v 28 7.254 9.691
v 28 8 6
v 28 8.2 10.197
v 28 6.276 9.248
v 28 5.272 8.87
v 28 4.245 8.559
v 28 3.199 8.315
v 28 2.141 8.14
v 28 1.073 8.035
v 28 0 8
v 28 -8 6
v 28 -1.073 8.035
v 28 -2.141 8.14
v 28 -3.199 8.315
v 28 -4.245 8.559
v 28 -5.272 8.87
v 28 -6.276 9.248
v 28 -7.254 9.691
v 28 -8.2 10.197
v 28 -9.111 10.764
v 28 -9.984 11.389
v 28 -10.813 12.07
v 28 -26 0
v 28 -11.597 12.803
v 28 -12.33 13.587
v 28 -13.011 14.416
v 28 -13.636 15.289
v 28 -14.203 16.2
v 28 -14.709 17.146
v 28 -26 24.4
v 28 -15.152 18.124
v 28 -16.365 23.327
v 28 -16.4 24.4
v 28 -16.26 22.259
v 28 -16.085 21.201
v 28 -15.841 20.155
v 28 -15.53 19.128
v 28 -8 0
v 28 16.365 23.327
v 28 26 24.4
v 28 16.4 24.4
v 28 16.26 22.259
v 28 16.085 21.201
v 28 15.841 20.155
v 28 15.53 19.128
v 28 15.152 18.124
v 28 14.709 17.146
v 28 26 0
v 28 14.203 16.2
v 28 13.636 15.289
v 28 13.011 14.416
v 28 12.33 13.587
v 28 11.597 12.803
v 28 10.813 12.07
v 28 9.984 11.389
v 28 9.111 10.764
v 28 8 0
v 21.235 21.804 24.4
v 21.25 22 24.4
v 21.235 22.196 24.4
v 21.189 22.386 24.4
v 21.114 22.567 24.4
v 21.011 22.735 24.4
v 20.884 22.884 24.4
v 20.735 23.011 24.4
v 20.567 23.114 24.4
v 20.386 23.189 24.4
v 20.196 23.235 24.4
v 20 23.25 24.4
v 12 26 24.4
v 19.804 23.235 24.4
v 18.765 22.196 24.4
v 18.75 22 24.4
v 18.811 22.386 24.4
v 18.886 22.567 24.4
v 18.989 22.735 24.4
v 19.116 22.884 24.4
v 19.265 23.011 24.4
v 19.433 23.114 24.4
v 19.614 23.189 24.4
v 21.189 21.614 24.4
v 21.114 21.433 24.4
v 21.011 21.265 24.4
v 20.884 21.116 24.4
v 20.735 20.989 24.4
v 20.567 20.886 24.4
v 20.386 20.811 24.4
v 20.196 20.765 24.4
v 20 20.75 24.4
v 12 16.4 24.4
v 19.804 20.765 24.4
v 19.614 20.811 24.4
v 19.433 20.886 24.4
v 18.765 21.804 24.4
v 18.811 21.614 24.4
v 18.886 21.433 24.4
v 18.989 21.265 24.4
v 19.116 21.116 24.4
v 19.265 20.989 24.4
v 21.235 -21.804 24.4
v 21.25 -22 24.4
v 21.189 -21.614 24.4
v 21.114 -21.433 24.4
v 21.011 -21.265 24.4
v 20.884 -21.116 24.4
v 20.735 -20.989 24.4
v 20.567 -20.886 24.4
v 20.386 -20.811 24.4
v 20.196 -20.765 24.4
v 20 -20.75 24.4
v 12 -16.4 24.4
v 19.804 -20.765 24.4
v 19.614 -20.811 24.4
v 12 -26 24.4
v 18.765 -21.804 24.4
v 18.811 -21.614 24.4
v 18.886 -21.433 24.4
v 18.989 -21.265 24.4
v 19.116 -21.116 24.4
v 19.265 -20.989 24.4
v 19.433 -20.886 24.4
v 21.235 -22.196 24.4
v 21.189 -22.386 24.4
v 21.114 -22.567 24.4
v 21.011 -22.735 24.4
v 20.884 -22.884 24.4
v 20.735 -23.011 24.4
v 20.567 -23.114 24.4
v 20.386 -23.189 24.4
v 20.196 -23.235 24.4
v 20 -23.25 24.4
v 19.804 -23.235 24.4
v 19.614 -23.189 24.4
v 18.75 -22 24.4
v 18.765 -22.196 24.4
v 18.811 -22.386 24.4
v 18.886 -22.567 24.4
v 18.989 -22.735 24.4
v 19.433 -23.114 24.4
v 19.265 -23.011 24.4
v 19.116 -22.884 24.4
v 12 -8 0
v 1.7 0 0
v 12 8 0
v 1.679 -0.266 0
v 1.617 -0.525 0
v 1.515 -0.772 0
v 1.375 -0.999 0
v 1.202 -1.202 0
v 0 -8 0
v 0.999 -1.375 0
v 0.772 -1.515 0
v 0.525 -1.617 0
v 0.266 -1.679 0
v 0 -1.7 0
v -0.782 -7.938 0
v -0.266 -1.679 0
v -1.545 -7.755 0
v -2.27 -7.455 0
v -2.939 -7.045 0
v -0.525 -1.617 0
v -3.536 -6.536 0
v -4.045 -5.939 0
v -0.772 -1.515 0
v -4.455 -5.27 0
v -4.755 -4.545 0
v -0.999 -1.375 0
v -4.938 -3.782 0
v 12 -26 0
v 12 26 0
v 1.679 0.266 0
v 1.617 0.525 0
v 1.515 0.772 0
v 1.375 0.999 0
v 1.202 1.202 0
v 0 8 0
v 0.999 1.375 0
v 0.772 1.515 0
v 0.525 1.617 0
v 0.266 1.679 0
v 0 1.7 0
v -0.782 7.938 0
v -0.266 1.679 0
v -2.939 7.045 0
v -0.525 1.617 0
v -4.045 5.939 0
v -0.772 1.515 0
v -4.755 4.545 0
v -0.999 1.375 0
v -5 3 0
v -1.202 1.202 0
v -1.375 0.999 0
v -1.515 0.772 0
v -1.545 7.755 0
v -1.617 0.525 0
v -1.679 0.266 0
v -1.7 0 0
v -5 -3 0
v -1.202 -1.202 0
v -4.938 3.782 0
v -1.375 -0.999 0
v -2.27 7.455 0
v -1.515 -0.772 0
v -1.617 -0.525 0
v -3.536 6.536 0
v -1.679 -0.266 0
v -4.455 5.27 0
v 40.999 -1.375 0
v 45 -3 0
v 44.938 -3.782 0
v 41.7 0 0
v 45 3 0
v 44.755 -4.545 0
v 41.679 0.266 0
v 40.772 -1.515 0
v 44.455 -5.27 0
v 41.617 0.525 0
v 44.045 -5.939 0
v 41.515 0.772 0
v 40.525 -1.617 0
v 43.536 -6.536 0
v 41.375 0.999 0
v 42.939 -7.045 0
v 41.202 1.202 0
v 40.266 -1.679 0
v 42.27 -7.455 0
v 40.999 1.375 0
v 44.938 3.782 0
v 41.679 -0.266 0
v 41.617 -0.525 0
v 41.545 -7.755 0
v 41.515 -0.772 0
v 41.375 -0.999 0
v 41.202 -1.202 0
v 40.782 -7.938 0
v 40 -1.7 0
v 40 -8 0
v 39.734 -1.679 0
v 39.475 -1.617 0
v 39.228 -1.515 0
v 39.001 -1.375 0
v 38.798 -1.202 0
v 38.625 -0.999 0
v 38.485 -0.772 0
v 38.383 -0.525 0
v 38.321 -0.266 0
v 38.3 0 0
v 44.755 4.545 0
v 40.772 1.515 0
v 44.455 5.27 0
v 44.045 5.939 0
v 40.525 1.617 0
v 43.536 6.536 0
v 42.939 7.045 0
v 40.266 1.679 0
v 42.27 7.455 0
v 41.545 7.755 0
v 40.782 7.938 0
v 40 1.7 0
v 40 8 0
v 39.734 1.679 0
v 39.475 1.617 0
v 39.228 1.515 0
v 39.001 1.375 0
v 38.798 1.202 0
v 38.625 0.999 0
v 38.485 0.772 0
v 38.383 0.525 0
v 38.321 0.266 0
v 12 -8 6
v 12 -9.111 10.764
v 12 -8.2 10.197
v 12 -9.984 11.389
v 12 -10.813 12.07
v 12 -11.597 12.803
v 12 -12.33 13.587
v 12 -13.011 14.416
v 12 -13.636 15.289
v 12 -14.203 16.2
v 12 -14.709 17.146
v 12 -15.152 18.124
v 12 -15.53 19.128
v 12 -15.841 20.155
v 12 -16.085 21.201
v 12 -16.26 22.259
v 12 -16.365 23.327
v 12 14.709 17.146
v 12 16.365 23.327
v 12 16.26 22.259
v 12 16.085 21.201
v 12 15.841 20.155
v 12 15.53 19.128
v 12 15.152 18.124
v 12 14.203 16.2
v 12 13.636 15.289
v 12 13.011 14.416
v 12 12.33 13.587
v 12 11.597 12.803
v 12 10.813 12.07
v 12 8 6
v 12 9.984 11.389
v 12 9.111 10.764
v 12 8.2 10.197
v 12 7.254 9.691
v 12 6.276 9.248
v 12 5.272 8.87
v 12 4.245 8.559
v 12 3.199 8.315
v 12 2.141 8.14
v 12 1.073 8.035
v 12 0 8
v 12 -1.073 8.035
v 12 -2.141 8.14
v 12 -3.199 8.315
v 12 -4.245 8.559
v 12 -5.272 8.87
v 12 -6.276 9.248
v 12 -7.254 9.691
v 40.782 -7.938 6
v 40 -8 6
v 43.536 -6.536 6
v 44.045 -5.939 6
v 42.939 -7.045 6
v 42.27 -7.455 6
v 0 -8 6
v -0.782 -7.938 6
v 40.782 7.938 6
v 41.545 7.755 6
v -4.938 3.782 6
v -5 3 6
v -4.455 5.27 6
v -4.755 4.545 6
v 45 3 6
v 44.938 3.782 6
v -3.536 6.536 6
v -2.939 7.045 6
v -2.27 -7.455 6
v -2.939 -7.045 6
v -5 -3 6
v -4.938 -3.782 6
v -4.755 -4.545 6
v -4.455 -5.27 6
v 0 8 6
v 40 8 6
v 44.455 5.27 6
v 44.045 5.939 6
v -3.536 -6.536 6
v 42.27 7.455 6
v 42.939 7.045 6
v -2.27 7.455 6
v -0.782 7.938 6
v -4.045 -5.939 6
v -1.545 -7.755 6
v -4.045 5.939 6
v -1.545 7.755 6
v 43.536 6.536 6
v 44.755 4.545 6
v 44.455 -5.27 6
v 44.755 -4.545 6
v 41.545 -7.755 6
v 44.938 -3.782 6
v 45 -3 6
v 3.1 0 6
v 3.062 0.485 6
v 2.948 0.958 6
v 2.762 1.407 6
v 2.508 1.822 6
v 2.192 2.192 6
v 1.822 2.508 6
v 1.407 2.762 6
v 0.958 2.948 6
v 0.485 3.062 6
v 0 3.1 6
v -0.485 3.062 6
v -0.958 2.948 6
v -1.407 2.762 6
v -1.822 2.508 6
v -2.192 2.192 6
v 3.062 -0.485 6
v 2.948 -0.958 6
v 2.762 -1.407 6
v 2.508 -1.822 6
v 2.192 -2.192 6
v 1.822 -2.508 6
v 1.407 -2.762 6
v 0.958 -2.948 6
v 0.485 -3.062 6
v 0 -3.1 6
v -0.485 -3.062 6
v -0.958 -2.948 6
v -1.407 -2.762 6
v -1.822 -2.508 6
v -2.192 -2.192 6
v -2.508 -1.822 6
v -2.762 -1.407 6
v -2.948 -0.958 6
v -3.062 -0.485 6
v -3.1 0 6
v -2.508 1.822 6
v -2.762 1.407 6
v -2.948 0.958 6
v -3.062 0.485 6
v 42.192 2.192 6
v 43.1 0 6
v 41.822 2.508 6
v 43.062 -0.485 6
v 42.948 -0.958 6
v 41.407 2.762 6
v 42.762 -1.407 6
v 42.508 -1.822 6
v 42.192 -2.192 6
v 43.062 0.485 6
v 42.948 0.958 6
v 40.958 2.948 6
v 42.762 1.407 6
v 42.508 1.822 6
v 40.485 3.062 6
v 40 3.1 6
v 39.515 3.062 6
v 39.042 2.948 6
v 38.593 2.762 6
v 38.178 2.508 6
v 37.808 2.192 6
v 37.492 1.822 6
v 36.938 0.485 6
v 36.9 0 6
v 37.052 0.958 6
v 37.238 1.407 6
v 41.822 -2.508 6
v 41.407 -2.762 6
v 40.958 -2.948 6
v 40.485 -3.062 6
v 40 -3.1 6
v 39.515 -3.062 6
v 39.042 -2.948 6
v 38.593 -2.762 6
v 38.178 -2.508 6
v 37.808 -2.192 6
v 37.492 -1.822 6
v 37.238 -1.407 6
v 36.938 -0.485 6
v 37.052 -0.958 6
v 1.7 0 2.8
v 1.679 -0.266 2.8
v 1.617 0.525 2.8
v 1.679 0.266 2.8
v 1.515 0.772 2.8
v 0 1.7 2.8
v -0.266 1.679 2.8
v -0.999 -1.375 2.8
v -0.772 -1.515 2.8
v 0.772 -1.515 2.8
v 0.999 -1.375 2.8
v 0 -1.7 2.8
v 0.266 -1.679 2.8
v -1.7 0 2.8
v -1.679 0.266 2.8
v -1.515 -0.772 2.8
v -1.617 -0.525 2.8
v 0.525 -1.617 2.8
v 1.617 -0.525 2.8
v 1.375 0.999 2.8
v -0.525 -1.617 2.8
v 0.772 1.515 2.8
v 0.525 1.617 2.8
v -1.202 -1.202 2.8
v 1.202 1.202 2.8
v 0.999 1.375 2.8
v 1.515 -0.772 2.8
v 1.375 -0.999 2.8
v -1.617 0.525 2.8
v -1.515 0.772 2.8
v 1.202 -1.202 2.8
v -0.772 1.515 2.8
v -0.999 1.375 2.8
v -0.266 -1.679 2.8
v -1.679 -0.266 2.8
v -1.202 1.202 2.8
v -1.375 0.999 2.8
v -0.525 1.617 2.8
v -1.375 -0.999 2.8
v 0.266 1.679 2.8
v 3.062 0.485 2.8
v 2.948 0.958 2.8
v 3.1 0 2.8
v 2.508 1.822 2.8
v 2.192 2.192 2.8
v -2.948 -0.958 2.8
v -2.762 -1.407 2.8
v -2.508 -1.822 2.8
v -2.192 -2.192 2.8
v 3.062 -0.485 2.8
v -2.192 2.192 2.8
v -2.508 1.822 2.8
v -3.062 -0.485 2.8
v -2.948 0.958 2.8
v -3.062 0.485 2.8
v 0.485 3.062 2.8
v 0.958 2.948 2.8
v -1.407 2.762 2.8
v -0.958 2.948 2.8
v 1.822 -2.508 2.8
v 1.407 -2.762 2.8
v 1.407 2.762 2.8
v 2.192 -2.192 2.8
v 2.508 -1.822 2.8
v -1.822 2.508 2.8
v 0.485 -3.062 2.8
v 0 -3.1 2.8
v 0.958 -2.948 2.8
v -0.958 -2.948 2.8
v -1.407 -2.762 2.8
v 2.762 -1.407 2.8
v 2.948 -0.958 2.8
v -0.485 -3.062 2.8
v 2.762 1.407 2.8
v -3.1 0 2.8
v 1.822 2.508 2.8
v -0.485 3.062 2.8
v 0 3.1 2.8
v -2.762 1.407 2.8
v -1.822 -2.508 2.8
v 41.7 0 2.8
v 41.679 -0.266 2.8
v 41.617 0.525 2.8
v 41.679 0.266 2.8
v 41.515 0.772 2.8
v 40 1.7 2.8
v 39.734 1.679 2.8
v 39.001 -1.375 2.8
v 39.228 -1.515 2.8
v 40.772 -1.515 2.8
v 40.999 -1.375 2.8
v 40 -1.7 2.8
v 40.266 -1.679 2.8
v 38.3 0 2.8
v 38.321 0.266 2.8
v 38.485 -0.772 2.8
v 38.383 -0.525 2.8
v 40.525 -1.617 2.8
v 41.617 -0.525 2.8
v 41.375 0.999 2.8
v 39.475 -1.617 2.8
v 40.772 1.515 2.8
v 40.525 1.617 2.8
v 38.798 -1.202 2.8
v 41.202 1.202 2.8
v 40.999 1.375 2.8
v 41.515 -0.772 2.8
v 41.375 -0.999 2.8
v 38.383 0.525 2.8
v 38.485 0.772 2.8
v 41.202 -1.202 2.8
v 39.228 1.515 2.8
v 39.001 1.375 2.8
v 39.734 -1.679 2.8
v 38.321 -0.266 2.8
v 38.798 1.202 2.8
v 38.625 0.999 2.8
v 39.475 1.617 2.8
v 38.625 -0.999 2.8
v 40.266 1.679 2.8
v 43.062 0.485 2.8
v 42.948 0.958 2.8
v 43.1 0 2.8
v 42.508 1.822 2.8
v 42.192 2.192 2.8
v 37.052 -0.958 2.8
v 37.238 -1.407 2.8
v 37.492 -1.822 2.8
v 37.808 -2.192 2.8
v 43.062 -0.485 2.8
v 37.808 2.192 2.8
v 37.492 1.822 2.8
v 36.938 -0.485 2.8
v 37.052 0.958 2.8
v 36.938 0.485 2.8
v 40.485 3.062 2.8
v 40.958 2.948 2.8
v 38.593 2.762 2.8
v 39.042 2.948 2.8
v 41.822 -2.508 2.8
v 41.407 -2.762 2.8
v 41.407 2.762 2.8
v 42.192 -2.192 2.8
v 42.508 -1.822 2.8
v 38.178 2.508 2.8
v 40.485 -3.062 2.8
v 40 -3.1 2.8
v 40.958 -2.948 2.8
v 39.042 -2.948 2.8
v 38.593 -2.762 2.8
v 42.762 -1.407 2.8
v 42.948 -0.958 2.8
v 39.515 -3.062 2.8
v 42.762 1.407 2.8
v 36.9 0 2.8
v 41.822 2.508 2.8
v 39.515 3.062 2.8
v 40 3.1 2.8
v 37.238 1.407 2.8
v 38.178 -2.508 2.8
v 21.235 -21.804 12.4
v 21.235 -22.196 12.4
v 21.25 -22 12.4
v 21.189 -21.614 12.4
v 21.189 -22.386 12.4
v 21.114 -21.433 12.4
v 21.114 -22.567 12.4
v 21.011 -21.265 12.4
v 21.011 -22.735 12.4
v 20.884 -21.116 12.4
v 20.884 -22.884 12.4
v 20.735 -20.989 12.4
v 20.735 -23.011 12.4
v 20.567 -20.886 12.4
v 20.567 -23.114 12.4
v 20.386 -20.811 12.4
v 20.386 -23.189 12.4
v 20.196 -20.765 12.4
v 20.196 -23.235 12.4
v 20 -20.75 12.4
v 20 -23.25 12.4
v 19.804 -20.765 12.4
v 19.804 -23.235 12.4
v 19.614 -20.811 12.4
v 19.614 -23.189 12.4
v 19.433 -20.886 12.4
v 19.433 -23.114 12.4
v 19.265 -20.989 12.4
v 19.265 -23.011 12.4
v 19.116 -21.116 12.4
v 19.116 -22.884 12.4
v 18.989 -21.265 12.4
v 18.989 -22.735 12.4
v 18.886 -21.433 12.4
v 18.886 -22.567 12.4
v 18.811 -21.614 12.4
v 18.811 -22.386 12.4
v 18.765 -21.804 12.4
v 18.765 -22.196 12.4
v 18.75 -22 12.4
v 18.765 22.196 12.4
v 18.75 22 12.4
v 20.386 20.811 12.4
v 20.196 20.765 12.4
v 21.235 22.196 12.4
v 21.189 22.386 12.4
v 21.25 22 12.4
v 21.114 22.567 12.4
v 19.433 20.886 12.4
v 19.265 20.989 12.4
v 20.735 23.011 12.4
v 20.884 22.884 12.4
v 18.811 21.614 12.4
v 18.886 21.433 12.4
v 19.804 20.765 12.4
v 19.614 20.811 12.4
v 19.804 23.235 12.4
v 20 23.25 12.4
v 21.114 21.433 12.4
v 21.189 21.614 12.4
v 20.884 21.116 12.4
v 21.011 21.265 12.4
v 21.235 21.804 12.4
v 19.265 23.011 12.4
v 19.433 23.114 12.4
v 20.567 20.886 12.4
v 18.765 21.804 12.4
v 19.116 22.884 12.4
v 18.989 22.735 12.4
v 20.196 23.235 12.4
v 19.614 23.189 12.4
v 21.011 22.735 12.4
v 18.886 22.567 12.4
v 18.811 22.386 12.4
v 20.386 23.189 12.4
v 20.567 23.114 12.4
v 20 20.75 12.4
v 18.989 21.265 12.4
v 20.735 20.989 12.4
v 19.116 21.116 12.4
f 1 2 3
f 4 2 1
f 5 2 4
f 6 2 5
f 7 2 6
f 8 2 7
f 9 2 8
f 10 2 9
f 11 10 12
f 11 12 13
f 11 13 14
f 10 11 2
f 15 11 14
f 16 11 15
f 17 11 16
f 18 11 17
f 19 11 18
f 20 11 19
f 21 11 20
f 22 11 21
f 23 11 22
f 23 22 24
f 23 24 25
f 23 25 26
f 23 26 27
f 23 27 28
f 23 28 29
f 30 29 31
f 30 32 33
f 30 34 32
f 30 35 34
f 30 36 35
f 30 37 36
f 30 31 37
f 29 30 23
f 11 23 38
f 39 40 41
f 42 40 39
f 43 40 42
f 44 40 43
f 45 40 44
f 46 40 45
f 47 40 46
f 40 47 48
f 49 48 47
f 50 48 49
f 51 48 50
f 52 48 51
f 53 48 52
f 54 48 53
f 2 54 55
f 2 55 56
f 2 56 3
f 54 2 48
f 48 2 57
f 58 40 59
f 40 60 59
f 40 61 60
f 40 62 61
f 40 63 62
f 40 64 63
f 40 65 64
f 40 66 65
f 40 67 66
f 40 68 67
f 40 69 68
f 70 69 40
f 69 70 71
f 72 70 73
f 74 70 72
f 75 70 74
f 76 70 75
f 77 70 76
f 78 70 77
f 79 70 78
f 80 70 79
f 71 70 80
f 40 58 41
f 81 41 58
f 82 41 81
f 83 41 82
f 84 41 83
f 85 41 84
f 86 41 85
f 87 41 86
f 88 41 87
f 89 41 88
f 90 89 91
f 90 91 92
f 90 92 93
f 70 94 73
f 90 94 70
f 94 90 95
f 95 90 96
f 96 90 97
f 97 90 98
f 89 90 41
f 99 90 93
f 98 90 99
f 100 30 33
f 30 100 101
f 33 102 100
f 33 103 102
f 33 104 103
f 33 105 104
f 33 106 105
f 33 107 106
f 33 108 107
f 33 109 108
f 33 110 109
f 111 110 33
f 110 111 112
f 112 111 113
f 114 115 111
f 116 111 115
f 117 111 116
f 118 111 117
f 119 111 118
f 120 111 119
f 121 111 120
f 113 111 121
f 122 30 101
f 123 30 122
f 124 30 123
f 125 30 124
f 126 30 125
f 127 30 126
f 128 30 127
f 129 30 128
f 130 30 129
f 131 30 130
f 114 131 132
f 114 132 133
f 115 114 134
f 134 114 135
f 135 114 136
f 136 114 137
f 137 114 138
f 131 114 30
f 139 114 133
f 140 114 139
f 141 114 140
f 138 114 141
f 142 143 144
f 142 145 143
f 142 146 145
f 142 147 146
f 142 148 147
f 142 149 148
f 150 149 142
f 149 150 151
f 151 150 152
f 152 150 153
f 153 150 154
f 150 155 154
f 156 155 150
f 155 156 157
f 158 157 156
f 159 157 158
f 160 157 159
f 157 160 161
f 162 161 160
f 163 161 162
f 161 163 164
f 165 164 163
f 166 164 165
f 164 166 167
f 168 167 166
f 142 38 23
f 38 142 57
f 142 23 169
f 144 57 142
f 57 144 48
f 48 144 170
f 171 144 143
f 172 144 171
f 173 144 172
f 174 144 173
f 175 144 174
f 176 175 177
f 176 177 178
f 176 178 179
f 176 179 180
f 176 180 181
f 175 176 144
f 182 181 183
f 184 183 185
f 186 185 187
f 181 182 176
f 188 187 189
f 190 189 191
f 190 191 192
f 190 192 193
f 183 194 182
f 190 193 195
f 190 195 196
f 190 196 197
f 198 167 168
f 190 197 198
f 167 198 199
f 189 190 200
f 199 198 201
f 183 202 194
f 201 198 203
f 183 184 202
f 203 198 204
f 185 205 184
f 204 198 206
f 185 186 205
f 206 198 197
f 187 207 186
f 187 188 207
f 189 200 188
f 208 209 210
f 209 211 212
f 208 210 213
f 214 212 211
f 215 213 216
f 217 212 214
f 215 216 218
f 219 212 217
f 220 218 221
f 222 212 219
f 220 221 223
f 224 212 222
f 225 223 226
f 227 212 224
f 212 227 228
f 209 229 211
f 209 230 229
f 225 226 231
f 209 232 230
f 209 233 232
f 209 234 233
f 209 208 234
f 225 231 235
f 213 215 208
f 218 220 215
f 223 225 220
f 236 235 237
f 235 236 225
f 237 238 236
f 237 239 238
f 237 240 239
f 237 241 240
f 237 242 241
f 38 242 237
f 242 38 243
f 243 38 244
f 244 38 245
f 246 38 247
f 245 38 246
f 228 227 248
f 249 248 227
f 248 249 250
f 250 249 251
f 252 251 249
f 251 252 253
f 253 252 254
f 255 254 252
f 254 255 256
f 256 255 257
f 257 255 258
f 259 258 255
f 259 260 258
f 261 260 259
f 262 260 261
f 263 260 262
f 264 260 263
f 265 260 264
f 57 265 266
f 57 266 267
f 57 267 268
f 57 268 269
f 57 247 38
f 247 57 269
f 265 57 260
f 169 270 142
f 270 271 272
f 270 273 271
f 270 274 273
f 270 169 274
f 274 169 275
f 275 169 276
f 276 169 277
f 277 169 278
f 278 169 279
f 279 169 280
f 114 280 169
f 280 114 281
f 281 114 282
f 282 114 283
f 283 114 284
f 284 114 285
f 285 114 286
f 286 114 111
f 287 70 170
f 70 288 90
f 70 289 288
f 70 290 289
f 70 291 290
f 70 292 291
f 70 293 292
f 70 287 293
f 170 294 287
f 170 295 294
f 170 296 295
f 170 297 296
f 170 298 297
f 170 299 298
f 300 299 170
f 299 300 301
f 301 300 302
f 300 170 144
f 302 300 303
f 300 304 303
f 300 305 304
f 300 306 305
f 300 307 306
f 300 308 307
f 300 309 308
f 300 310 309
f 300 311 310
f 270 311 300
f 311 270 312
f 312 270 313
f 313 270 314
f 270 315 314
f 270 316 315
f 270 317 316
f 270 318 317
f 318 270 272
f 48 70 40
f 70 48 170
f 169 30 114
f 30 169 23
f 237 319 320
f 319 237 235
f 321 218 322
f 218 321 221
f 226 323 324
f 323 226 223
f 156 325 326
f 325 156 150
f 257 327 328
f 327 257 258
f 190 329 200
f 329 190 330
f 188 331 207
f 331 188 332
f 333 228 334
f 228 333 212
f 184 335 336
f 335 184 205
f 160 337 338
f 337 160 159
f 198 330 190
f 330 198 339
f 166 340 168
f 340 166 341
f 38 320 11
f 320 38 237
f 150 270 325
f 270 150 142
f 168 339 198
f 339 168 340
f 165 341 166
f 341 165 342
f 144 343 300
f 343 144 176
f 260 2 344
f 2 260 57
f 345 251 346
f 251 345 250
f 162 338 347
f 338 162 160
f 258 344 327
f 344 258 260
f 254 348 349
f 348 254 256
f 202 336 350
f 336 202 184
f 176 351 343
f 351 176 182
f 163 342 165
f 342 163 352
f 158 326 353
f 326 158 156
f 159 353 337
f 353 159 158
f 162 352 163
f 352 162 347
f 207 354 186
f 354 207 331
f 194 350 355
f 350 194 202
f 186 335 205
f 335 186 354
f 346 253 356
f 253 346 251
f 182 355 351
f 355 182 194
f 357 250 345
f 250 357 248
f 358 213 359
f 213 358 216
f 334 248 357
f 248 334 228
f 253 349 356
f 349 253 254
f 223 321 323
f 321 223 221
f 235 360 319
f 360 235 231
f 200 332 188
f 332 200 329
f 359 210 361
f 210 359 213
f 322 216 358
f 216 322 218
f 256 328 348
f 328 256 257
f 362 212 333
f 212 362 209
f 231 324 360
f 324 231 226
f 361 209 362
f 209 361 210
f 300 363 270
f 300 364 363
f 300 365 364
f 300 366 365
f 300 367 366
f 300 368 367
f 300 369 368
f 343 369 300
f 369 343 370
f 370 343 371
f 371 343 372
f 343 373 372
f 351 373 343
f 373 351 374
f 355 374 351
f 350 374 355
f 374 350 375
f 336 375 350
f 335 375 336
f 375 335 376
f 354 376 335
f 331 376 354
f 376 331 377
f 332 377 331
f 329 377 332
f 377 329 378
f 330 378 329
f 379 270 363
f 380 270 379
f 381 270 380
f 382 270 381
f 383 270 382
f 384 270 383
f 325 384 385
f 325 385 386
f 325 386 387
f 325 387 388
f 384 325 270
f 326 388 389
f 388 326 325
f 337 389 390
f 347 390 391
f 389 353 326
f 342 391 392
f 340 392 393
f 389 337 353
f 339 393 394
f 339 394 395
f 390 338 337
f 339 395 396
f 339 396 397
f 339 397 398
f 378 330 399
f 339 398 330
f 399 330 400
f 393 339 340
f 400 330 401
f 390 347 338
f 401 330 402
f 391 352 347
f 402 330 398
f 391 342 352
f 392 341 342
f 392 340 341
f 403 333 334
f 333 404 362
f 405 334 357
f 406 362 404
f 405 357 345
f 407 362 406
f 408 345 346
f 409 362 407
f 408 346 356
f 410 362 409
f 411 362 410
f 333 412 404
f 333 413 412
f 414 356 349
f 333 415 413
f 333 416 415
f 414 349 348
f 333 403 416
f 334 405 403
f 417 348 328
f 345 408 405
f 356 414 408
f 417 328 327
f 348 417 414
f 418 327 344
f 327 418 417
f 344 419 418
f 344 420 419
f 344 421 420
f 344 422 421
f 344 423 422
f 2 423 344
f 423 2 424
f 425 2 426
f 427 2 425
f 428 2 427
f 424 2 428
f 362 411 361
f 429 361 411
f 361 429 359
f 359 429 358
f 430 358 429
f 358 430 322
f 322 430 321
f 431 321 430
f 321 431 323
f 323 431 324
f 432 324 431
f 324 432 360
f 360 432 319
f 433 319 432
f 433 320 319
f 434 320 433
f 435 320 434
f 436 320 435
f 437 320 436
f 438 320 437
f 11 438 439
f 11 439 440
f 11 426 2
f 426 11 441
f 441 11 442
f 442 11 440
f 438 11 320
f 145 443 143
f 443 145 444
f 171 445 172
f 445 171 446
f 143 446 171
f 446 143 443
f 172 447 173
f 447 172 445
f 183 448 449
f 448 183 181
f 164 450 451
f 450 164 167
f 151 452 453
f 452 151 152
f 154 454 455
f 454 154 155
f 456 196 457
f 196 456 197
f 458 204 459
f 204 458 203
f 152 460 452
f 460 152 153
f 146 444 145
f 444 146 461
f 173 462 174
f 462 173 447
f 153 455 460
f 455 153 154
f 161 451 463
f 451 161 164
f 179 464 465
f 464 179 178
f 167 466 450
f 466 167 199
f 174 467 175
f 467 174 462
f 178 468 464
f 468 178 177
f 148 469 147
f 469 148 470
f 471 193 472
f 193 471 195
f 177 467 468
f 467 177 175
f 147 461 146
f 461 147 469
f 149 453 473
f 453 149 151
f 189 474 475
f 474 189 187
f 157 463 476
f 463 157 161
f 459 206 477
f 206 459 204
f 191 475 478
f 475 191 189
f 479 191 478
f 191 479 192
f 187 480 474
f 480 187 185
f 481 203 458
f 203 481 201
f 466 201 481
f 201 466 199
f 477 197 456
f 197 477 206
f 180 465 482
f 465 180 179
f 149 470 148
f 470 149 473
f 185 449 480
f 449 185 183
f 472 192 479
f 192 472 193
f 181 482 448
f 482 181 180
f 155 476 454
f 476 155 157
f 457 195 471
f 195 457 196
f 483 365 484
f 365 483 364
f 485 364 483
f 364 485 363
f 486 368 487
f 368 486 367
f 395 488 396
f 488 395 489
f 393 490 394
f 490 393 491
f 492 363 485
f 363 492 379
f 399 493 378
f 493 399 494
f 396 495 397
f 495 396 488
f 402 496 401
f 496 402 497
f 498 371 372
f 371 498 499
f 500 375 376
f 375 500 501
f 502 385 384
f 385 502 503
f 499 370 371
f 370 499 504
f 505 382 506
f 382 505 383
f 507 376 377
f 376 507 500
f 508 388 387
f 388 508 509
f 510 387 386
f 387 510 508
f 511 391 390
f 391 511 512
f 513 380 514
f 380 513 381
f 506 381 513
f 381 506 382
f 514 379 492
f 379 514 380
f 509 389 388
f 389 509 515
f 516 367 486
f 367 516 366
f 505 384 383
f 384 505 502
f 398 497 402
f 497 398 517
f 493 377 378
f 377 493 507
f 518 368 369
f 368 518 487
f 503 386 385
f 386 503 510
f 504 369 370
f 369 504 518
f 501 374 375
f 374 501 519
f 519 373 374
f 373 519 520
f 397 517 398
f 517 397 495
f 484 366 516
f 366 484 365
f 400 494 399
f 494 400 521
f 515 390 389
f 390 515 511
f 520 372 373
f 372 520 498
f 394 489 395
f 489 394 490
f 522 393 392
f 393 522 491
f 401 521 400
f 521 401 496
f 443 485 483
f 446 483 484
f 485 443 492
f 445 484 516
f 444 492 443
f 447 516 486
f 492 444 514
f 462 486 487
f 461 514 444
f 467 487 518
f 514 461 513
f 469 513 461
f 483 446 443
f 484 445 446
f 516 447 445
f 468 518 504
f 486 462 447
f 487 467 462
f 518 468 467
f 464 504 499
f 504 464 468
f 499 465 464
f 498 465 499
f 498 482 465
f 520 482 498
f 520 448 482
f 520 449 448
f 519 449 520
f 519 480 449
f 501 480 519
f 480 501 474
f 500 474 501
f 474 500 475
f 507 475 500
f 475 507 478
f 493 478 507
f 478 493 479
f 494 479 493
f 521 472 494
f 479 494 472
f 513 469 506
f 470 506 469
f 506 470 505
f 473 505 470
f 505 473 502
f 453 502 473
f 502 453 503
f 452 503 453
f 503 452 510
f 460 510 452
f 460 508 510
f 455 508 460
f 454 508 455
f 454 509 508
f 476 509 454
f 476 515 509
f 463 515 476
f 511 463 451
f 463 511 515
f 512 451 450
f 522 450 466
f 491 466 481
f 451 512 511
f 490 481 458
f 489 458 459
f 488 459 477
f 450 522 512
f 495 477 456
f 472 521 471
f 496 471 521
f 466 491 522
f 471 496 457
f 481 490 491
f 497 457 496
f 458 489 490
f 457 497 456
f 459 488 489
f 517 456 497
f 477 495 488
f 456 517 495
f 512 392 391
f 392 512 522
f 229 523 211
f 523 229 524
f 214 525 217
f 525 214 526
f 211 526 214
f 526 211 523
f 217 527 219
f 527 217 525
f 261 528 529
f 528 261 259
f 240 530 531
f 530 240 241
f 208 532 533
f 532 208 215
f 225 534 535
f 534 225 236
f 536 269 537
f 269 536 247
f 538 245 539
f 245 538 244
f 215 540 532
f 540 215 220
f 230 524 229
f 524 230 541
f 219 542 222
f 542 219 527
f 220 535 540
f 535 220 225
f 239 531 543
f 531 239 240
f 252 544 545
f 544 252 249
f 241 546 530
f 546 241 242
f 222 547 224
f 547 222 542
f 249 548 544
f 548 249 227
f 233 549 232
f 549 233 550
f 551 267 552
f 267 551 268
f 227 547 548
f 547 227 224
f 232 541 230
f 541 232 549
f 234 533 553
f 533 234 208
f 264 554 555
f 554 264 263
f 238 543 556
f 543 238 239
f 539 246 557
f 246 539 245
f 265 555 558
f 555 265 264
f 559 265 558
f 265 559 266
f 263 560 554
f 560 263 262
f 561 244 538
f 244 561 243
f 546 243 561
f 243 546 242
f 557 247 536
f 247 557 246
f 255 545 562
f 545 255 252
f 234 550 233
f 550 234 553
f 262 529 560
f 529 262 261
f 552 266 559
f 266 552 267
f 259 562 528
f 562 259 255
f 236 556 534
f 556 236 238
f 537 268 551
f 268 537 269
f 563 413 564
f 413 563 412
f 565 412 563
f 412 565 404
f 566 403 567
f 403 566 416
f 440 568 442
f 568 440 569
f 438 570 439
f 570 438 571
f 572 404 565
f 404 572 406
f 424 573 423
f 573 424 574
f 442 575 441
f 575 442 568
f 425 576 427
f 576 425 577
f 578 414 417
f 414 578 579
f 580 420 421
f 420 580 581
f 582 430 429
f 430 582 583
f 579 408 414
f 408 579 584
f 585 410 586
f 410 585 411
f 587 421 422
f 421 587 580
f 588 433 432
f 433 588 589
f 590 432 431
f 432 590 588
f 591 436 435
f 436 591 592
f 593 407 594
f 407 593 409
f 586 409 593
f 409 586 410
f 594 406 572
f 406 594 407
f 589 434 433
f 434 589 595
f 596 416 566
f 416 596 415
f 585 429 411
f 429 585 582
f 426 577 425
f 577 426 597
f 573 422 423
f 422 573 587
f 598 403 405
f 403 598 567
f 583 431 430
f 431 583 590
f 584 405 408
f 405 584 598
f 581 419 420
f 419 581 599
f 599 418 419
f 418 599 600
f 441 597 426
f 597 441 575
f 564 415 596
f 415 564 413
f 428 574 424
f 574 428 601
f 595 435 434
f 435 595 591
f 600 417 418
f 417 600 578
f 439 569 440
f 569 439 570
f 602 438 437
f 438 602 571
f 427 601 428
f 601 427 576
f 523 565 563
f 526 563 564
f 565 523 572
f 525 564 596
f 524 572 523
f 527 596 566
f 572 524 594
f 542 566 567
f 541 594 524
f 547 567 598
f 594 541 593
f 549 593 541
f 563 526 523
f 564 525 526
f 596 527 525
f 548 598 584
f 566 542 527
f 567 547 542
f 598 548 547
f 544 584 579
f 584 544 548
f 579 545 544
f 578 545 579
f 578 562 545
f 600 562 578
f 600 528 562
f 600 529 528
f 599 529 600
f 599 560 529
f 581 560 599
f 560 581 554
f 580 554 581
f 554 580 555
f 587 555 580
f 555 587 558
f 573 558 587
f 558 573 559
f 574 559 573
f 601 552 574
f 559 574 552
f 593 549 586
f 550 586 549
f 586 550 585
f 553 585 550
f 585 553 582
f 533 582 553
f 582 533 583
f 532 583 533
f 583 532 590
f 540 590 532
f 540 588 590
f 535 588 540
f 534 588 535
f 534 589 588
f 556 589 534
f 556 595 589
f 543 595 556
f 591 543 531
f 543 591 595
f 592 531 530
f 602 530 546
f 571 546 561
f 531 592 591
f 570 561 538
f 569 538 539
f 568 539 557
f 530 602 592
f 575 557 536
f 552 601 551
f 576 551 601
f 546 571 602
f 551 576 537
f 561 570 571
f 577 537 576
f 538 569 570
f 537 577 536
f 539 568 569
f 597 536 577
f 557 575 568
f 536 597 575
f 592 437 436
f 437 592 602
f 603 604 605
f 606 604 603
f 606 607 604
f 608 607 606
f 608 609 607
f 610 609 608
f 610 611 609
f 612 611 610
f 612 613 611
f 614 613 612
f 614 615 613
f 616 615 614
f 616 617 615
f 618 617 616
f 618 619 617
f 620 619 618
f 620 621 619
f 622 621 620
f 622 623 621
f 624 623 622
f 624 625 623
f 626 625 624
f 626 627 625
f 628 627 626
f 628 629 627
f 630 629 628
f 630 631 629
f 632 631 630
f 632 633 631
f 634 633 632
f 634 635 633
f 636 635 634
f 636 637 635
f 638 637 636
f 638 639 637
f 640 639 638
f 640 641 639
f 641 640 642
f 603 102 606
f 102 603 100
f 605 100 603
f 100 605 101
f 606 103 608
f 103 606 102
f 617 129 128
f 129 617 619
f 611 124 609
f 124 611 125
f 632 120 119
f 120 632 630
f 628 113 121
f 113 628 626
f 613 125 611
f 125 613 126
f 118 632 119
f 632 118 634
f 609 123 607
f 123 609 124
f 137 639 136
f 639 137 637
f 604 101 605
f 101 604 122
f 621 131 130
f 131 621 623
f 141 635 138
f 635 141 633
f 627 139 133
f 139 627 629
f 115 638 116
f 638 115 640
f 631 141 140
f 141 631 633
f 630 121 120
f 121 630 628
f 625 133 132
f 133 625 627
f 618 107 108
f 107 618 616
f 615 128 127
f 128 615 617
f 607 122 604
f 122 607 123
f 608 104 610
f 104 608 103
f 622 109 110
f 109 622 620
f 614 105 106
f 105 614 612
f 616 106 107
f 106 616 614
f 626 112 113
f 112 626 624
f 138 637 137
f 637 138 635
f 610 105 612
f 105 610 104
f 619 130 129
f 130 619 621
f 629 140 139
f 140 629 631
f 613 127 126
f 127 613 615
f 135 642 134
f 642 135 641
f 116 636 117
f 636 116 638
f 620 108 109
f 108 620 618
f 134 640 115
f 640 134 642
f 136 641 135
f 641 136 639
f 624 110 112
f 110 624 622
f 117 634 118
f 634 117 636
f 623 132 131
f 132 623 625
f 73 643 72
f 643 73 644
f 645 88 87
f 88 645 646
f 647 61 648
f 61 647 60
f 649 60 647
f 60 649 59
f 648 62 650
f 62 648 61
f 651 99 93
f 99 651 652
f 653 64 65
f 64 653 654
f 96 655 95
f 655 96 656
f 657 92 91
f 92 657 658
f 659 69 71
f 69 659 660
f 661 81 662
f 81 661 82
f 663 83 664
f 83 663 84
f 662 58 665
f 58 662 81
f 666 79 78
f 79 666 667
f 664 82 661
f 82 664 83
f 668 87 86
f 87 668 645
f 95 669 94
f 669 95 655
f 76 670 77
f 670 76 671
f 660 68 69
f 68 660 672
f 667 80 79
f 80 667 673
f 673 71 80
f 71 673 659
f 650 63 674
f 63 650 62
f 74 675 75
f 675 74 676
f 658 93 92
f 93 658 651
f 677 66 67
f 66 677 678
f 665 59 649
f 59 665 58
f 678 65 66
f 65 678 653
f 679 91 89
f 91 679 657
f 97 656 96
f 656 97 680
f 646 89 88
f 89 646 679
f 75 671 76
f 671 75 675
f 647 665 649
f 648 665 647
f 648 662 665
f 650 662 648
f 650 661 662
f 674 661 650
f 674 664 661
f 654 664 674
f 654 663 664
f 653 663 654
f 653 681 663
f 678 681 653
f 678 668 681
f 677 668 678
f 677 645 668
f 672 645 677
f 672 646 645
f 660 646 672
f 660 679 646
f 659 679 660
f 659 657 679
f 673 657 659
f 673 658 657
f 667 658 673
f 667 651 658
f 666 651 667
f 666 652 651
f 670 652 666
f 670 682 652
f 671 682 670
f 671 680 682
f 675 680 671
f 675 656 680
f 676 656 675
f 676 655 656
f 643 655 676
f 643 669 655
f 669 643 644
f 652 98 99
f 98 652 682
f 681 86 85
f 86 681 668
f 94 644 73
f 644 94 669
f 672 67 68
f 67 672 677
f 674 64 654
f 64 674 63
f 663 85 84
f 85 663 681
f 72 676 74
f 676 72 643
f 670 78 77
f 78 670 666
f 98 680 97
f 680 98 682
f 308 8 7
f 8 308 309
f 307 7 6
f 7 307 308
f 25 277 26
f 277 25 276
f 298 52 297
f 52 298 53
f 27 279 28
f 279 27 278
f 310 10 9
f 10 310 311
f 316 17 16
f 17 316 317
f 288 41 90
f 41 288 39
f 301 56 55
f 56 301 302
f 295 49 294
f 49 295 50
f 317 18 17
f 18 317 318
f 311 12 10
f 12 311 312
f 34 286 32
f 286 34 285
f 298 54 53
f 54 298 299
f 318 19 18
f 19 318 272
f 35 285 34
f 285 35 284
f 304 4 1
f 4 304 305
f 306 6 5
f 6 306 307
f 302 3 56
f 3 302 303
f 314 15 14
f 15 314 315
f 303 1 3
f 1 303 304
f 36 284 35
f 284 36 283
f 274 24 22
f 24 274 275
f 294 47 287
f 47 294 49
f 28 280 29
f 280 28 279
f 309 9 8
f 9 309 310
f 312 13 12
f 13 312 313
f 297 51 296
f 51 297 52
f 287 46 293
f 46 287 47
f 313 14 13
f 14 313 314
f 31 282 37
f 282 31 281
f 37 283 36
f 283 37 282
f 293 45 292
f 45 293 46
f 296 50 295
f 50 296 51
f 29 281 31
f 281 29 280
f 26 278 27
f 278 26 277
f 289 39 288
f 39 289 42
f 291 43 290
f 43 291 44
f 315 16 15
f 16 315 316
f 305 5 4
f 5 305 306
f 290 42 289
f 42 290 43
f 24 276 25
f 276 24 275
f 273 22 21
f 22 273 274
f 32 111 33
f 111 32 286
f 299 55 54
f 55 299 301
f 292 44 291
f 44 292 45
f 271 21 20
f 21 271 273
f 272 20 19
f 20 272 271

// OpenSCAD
include <../lib/apache-case-modules-lib.scad>;
$fn = 40;
saddle_print();
